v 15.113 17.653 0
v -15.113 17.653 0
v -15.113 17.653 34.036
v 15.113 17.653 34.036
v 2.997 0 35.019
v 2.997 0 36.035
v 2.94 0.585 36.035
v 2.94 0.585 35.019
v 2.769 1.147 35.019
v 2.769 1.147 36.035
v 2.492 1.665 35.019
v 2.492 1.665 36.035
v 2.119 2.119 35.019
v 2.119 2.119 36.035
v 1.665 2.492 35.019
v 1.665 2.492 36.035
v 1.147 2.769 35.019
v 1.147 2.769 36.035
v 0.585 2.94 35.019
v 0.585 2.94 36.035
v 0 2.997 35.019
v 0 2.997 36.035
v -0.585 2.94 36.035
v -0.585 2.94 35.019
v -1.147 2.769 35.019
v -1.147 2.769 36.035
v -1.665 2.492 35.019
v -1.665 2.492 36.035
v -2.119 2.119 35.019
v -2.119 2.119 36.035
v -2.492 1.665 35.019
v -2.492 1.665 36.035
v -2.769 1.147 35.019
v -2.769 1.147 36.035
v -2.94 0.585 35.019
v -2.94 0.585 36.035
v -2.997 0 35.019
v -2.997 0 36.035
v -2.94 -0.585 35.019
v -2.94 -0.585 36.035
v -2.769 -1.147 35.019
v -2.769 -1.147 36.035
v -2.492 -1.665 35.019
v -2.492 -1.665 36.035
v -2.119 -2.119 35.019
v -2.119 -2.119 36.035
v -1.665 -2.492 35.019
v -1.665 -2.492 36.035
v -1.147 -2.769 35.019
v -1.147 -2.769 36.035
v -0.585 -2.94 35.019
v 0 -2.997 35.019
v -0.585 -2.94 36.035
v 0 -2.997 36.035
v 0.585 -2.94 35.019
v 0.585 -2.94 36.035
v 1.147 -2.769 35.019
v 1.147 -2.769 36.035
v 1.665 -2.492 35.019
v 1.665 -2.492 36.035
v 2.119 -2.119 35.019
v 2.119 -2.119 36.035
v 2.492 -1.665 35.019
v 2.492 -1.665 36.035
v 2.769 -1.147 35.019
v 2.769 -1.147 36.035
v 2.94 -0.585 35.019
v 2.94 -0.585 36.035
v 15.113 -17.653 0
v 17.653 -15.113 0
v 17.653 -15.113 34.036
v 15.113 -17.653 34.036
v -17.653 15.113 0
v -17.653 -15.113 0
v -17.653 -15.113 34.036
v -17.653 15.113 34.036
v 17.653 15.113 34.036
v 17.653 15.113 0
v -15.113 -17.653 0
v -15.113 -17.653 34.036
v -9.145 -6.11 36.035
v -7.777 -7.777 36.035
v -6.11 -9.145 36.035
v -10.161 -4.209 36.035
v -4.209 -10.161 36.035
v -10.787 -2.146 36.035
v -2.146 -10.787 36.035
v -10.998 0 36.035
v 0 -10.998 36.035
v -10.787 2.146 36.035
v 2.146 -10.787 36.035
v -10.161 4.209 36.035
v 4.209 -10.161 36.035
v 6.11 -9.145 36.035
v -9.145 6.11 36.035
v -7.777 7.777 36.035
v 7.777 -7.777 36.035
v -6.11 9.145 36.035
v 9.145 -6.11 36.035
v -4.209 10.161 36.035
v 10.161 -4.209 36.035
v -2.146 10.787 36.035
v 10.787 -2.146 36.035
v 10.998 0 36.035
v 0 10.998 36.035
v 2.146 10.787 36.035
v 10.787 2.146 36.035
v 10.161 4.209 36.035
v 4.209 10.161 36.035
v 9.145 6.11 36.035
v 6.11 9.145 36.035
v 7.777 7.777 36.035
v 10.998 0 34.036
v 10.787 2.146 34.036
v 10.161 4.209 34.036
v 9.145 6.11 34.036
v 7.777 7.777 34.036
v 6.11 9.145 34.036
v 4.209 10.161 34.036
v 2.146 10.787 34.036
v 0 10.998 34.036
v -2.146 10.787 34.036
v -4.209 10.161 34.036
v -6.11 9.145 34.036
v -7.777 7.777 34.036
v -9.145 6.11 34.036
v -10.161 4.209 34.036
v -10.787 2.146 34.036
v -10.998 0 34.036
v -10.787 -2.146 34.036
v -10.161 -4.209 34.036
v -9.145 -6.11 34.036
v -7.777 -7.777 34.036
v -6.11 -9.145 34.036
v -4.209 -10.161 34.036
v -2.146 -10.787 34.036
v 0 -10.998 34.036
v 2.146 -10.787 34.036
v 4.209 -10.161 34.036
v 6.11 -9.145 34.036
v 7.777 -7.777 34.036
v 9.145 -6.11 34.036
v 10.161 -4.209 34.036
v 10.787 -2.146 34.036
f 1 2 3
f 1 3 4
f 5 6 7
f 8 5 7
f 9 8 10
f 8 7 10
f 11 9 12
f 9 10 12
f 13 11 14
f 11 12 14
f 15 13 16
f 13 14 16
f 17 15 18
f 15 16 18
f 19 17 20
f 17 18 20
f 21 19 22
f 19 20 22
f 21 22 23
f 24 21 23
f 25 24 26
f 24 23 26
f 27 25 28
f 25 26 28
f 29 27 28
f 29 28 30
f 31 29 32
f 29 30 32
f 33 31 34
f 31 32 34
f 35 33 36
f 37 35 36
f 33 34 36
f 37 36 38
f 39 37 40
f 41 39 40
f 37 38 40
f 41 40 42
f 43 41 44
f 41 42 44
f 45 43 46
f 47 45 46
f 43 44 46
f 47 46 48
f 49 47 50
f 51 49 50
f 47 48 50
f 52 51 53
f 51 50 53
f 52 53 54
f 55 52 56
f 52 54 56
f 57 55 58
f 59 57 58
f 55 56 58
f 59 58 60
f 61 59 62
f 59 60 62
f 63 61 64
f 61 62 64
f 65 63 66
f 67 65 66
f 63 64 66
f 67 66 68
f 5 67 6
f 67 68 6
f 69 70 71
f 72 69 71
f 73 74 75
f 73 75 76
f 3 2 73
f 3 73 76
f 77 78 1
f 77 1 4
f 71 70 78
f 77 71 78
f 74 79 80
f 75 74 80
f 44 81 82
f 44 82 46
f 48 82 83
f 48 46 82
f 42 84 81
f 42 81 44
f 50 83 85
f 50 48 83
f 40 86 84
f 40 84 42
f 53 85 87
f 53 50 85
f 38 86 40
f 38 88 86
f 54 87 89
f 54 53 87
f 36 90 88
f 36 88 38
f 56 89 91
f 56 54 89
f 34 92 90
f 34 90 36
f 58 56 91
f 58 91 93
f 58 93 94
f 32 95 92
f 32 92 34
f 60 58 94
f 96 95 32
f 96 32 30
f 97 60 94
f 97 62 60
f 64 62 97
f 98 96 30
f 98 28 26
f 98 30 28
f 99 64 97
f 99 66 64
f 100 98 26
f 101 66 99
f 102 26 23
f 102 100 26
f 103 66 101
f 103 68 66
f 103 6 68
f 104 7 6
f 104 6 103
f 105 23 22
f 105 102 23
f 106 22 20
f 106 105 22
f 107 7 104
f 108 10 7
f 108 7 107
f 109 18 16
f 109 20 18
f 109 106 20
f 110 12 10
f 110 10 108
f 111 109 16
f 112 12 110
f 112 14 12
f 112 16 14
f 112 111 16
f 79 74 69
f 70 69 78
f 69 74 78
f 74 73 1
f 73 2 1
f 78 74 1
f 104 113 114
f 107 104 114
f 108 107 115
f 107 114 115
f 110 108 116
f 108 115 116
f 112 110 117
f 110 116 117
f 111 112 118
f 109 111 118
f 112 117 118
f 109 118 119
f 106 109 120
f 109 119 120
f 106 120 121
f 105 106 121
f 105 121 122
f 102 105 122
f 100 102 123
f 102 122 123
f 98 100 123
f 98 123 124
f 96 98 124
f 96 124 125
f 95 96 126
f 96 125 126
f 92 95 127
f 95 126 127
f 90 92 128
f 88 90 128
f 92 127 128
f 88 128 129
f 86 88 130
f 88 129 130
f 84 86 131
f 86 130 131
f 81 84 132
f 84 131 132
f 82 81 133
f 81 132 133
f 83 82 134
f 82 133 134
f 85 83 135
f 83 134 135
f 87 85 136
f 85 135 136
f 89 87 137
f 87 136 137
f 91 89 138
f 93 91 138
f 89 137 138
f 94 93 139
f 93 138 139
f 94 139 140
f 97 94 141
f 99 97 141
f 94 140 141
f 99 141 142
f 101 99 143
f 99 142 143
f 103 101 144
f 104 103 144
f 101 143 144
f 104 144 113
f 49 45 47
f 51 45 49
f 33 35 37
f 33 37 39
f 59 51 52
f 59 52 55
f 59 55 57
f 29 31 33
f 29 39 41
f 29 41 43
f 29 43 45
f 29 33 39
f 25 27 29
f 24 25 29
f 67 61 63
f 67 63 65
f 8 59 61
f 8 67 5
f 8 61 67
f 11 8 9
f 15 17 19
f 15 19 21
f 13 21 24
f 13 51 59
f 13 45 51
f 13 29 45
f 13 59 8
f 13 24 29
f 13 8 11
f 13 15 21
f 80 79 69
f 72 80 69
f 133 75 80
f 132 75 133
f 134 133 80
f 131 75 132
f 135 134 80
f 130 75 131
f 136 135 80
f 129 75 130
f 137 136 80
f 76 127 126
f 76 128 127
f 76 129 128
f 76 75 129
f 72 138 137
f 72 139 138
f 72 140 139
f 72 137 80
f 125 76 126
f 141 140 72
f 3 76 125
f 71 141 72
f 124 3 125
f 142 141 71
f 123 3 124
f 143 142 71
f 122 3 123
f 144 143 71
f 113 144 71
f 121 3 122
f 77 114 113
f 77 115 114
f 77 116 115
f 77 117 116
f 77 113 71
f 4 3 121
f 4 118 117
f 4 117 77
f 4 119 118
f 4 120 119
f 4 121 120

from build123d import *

# Parameters (mm, degrees)
SKETCH1_W           = 35.306
SKETCH1_H           = 35.306
BOSS_EXTRUDE1_DEPTH = 34.036
SKETCH2_R           = 10.9982
BOSS_EXTRUDE2_DEPTH = 1.99898
SKETCH3_R           = 2.9972
CUT_EXTRUDE1_DEPTH  = 1.016
CHAMFER1_SIZE       = 2.54


with BuildPart() as part:
    # Sketch1 → Boss-Extrude1 (new body)
    with BuildSketch(Plane.XY):
        Rectangle(SKETCH1_W, SKETCH1_H)
    extrude(amount=BOSS_EXTRUDE1_DEPTH)

    # Sketch2 → Boss-Extrude2 (add)
    with BuildSketch(Plane.XY.offset(34.036)):
        Circle(SKETCH2_R)
    extrude(amount=BOSS_EXTRUDE2_DEPTH)

    # Sketch3 → Cut-Extrude1 (cut)
    with BuildSketch(Plane.XY.offset(36.03498)):
        Circle(SKETCH3_R)
    extrude(amount=-CUT_EXTRUDE1_DEPTH, mode=Mode.SUBTRACT)

    # Chamfer1
    chamfer1_edges = [part.edges().sort_by_distance(p)[0] for p in [
        (-17.653, 17.653, 17.018),
        (17.653, 17.653, 17.018),
        (17.653, -17.653, 17.018),
        (-17.653, -17.653, 17.018),
    ]]
    chamfer(chamfer1_edges, length=CHAMFER1_SIZE)


solid = part.part
